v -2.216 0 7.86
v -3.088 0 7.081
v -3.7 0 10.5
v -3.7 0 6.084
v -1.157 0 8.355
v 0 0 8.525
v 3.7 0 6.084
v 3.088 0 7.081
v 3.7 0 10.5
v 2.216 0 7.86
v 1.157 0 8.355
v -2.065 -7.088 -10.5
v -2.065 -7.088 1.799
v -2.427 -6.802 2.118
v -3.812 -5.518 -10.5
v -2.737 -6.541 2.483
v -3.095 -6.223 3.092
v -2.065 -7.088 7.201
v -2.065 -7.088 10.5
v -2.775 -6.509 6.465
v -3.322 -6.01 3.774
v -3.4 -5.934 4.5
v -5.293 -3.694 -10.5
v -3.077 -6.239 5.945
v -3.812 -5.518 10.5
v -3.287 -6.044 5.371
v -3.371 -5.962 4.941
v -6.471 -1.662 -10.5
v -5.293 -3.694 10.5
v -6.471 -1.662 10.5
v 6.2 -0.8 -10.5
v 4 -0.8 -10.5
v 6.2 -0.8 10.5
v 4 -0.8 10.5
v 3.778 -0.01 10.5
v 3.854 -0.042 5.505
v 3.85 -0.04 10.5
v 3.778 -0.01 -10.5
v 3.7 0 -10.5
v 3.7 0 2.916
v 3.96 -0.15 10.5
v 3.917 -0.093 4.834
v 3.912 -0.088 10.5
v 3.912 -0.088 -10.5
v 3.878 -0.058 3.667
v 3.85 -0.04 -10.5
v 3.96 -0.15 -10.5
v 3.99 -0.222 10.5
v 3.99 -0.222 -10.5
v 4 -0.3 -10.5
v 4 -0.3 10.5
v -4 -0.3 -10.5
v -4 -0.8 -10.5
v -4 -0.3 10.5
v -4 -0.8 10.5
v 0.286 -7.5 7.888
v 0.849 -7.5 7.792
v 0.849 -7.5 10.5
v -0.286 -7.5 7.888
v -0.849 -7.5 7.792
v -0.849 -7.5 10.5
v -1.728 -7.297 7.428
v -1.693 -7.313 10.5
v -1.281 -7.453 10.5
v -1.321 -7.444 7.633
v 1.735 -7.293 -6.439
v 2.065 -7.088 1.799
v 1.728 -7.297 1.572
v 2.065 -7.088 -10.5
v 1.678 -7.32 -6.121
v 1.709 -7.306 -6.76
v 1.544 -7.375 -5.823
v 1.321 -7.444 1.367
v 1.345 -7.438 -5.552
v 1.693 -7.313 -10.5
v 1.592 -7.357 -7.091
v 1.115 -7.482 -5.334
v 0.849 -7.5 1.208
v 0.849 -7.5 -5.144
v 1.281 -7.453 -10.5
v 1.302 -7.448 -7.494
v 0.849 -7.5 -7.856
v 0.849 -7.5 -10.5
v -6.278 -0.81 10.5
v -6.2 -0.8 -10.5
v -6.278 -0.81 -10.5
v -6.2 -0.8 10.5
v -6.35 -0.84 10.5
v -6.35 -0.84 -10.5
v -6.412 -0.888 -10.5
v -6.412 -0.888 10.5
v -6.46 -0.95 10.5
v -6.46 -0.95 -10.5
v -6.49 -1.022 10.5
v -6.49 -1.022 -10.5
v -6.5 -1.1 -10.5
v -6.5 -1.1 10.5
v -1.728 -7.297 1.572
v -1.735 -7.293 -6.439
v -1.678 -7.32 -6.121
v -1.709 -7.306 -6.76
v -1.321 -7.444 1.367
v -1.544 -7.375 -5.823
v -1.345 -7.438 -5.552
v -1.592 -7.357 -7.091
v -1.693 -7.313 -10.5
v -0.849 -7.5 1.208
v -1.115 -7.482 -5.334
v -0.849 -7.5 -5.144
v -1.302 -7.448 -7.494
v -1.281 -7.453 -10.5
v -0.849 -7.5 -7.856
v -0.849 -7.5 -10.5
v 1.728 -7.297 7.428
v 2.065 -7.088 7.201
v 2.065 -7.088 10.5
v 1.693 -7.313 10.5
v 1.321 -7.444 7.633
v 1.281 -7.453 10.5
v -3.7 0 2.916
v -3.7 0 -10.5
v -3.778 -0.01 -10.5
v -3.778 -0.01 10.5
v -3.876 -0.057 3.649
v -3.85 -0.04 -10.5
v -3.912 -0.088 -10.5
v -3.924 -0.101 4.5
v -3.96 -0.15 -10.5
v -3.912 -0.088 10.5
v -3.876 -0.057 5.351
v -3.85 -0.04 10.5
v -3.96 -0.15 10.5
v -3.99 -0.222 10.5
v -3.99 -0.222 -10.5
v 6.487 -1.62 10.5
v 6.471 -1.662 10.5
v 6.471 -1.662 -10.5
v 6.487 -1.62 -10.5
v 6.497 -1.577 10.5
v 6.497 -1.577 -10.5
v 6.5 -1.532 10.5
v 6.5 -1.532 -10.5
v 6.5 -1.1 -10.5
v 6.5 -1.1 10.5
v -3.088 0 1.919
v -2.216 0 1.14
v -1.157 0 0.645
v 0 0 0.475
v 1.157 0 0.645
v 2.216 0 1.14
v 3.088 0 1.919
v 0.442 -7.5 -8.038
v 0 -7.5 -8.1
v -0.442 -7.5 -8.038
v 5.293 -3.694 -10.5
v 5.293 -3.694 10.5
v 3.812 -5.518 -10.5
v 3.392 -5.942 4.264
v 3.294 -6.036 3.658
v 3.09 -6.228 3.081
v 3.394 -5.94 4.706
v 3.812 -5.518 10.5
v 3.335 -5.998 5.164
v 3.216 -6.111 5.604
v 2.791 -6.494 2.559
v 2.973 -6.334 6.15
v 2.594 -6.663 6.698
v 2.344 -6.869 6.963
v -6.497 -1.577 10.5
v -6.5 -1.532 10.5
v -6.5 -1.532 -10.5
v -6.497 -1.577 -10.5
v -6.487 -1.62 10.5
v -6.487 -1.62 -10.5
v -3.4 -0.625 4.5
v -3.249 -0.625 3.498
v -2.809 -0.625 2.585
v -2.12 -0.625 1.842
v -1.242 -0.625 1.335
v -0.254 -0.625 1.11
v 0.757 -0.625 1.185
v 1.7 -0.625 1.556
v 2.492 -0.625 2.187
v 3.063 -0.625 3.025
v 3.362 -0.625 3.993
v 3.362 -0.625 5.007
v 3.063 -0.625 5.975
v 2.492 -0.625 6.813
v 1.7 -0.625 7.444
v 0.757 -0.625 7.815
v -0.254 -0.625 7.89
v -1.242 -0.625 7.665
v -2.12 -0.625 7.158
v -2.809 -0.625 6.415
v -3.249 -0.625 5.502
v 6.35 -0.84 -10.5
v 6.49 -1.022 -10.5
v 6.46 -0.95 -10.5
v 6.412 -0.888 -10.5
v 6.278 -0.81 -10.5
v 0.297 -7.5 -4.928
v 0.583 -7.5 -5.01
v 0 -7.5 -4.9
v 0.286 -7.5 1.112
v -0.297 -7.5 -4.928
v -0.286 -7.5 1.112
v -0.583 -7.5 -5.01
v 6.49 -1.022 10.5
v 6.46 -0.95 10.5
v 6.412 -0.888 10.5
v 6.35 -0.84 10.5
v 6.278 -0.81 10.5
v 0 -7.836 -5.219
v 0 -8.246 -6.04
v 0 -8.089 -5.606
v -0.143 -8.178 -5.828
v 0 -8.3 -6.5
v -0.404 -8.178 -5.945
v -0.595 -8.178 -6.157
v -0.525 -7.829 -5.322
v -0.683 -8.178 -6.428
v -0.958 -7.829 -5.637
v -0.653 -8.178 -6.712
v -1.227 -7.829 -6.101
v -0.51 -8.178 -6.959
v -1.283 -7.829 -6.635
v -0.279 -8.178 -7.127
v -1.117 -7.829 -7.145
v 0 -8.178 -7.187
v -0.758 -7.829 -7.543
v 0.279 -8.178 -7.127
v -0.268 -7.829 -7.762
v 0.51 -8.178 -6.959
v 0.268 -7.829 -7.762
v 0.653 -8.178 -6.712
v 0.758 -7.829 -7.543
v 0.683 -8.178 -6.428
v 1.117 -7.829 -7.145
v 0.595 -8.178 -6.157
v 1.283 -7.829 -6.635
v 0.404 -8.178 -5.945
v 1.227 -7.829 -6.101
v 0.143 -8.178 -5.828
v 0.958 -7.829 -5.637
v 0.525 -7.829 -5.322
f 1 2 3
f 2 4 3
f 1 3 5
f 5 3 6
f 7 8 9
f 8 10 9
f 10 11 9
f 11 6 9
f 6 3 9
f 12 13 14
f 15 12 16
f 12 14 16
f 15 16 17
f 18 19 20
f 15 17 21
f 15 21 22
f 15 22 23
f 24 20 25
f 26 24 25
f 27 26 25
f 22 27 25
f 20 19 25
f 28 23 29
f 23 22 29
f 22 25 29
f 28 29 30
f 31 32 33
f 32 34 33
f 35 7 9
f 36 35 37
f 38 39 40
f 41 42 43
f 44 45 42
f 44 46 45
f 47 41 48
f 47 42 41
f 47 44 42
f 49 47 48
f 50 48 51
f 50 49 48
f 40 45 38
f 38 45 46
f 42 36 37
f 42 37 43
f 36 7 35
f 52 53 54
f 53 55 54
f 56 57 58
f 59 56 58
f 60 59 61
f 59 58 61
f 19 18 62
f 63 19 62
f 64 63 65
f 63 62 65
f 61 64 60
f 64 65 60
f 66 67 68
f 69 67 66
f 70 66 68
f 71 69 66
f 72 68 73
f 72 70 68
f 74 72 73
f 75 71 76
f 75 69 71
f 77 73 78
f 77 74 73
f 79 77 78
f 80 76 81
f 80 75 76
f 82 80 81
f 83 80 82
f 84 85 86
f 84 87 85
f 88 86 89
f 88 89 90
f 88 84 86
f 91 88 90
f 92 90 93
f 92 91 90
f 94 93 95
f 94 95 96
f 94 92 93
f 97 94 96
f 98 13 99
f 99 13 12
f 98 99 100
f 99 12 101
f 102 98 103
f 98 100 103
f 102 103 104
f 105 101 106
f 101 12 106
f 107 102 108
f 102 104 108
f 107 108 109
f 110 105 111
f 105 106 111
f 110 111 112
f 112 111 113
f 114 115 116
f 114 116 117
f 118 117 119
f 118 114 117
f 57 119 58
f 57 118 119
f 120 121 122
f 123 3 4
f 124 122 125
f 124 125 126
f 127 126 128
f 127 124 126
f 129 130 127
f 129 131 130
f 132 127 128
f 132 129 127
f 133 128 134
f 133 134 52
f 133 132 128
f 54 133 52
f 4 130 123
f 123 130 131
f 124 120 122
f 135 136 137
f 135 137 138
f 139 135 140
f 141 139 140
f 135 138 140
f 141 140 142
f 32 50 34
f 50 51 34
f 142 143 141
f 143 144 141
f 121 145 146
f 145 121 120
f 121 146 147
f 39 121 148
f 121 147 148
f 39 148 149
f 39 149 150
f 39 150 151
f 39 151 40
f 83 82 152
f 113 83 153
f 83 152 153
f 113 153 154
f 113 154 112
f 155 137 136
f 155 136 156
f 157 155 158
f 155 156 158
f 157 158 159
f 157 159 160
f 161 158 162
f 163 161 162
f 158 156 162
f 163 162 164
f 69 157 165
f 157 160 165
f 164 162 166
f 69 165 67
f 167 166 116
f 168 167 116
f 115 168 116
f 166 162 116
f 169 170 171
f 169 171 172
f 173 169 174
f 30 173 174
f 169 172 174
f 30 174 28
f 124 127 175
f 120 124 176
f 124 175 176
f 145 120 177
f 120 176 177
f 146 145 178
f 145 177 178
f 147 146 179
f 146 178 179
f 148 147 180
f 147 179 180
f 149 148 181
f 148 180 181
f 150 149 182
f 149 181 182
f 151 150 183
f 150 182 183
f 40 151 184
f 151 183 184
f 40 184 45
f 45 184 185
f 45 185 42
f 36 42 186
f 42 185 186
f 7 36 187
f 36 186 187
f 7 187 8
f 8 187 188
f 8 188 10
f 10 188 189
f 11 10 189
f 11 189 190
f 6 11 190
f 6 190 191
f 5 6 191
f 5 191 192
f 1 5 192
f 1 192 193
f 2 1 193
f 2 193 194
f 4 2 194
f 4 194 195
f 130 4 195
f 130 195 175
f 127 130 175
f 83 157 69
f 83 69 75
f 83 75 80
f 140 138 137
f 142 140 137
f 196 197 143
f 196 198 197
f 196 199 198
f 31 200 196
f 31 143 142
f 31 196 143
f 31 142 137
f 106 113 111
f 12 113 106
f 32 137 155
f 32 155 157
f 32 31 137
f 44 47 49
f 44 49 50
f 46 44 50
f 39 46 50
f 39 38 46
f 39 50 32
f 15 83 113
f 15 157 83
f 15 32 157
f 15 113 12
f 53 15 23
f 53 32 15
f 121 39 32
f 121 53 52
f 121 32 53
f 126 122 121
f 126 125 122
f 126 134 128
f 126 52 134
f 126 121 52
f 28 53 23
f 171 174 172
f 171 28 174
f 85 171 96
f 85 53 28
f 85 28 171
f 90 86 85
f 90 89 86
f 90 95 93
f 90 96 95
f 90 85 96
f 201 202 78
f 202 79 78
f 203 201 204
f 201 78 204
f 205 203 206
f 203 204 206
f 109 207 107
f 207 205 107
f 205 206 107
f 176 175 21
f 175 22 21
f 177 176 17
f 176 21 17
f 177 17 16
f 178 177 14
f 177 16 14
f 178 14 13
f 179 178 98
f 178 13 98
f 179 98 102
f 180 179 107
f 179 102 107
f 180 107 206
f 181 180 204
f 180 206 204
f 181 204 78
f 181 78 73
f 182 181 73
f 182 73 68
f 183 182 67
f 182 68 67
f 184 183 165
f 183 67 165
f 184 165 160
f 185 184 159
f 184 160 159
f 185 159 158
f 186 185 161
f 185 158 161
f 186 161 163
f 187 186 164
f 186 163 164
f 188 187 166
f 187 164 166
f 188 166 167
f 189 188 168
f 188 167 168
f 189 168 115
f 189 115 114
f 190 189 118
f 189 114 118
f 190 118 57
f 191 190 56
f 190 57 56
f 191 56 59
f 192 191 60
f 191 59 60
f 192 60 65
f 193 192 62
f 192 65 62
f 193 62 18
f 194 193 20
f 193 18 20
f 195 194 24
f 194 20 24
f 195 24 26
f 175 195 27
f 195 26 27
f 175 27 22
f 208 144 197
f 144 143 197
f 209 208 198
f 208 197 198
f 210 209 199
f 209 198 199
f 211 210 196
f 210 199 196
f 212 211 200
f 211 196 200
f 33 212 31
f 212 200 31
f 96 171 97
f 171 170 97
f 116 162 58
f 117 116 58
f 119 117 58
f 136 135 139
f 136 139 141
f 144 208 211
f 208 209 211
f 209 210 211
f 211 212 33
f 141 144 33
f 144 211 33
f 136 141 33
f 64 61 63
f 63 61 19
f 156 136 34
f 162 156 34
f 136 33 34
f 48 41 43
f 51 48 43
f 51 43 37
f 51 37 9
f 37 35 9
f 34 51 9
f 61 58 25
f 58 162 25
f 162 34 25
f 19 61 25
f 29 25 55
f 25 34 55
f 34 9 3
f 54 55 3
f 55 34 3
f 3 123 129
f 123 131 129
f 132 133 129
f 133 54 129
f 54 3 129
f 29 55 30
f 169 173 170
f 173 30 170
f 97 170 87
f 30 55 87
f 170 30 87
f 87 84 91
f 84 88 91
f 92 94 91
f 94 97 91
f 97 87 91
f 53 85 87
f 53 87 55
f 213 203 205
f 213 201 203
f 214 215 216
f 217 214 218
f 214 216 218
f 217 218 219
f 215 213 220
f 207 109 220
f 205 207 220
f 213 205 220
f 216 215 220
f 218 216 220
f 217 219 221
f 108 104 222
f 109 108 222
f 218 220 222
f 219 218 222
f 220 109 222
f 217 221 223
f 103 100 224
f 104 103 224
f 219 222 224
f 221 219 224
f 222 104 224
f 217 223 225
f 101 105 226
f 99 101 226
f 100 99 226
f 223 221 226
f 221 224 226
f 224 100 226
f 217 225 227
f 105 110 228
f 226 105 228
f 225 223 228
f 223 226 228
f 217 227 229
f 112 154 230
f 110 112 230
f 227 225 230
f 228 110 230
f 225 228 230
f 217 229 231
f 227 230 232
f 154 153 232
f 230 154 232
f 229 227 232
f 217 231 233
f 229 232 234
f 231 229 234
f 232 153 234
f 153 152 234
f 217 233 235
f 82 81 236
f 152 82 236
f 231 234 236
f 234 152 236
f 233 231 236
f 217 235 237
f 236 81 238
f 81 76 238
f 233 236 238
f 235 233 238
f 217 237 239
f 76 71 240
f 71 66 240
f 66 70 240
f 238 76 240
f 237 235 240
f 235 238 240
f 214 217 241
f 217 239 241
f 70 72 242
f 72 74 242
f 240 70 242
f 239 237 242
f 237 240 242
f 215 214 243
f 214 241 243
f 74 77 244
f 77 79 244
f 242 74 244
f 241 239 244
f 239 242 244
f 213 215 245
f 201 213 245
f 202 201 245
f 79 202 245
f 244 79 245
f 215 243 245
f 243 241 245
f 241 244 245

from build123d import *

# Parameters (mm, degrees)
EXTRUDE_1_DEPTH             = 10.5
FILLET_1_R                  = 0.3
FILLET_2_R                  = 2
HOLE_WIZARD_M82_D           = 6.8
HOLE_WIZARD_M82_CSINK_D     = 8.05
HOLE_WIZARD_M82_CSINK_ANGLE = 90


with BuildPart() as part:
    # Эскиз1 → Бобышка-Вытянуть1 (new body, symmetric)
    with BuildSketch(Plane.XY):
        with BuildLine():
            Line((-4, 0), (4, 0))
            Line((4, 0), (4, -0.8))
            Line((4, -0.8), (6.5, -0.8))
            Line((6.5, -0.8), (6.5, -1.6))
            ThreePointArc((6.5, -1.6), (4.386776199, -4.87777644), (1.5, -7.5))
            Line((1.5, -7.5), (-1.5, -7.5))
            ThreePointArc((-1.5, -7.5), (-4.386776199, -4.87777644), (-6.5, -1.6))
            Line((-6.5, -1.6), (-6.5, -0.8))
            Line((-6.5, -0.8), (-4, -0.8))
            Line((-4, -0.8), (-4, 0))
        make_face()
    extrude(amount=EXTRUDE_1_DEPTH, both=True)

    # Скругление1
    fillet_1_edges = [part.edges().sort_by_distance(p)[0] for p in [
        (6.5, -0.8, 0),
        (6.5, -1.6, 0),
        (-6.5, -1.6, 0),
        (-6.5, -0.8, 0),
        (-4, 0, 0),
        (4, 0, 0),
    ]]
    fillet(fillet_1_edges, radius=FILLET_1_R)

    # Скругление2
    fillet_2_edges = [part.edges().sort_by_distance(p)[0] for p in [
        (1.5, -7.5, 0),
        (-1.5, -7.5, 0),
    ]]
    fillet(fillet_2_edges, radius=FILLET_2_R)

    # Отверстие обработанное метчиком M82 (through all)
    with Locations(Plane(origin=(0, 0, 0), x_dir=(1, 0, 0), z_dir=(0, 1, 0))):
        with Locations((0, -4.5)):
            CounterSinkHole(HOLE_WIZARD_M82_D / 2, HOLE_WIZARD_M82_CSINK_D / 2, counter_sink_angle=HOLE_WIZARD_M82_CSINK_ANGLE)

    # Эскиз5 → Повернуть1 (revolve)
    with BuildSketch(Plane(origin=(0, 0, 0), x_dir=(0, 0, -1), z_dir=(1, 0, 0))):
        with BuildLine():
            Line((6.5, -4.3), (6.5, -8.3))
            ThreePointArc((6.5, -8.3), (4.5, -6.3), (6.5, -4.3))
        make_face()
    revolve(axis=Axis((0, -4.3, -6.5), (0, -1, 0)))


solid = part.part
